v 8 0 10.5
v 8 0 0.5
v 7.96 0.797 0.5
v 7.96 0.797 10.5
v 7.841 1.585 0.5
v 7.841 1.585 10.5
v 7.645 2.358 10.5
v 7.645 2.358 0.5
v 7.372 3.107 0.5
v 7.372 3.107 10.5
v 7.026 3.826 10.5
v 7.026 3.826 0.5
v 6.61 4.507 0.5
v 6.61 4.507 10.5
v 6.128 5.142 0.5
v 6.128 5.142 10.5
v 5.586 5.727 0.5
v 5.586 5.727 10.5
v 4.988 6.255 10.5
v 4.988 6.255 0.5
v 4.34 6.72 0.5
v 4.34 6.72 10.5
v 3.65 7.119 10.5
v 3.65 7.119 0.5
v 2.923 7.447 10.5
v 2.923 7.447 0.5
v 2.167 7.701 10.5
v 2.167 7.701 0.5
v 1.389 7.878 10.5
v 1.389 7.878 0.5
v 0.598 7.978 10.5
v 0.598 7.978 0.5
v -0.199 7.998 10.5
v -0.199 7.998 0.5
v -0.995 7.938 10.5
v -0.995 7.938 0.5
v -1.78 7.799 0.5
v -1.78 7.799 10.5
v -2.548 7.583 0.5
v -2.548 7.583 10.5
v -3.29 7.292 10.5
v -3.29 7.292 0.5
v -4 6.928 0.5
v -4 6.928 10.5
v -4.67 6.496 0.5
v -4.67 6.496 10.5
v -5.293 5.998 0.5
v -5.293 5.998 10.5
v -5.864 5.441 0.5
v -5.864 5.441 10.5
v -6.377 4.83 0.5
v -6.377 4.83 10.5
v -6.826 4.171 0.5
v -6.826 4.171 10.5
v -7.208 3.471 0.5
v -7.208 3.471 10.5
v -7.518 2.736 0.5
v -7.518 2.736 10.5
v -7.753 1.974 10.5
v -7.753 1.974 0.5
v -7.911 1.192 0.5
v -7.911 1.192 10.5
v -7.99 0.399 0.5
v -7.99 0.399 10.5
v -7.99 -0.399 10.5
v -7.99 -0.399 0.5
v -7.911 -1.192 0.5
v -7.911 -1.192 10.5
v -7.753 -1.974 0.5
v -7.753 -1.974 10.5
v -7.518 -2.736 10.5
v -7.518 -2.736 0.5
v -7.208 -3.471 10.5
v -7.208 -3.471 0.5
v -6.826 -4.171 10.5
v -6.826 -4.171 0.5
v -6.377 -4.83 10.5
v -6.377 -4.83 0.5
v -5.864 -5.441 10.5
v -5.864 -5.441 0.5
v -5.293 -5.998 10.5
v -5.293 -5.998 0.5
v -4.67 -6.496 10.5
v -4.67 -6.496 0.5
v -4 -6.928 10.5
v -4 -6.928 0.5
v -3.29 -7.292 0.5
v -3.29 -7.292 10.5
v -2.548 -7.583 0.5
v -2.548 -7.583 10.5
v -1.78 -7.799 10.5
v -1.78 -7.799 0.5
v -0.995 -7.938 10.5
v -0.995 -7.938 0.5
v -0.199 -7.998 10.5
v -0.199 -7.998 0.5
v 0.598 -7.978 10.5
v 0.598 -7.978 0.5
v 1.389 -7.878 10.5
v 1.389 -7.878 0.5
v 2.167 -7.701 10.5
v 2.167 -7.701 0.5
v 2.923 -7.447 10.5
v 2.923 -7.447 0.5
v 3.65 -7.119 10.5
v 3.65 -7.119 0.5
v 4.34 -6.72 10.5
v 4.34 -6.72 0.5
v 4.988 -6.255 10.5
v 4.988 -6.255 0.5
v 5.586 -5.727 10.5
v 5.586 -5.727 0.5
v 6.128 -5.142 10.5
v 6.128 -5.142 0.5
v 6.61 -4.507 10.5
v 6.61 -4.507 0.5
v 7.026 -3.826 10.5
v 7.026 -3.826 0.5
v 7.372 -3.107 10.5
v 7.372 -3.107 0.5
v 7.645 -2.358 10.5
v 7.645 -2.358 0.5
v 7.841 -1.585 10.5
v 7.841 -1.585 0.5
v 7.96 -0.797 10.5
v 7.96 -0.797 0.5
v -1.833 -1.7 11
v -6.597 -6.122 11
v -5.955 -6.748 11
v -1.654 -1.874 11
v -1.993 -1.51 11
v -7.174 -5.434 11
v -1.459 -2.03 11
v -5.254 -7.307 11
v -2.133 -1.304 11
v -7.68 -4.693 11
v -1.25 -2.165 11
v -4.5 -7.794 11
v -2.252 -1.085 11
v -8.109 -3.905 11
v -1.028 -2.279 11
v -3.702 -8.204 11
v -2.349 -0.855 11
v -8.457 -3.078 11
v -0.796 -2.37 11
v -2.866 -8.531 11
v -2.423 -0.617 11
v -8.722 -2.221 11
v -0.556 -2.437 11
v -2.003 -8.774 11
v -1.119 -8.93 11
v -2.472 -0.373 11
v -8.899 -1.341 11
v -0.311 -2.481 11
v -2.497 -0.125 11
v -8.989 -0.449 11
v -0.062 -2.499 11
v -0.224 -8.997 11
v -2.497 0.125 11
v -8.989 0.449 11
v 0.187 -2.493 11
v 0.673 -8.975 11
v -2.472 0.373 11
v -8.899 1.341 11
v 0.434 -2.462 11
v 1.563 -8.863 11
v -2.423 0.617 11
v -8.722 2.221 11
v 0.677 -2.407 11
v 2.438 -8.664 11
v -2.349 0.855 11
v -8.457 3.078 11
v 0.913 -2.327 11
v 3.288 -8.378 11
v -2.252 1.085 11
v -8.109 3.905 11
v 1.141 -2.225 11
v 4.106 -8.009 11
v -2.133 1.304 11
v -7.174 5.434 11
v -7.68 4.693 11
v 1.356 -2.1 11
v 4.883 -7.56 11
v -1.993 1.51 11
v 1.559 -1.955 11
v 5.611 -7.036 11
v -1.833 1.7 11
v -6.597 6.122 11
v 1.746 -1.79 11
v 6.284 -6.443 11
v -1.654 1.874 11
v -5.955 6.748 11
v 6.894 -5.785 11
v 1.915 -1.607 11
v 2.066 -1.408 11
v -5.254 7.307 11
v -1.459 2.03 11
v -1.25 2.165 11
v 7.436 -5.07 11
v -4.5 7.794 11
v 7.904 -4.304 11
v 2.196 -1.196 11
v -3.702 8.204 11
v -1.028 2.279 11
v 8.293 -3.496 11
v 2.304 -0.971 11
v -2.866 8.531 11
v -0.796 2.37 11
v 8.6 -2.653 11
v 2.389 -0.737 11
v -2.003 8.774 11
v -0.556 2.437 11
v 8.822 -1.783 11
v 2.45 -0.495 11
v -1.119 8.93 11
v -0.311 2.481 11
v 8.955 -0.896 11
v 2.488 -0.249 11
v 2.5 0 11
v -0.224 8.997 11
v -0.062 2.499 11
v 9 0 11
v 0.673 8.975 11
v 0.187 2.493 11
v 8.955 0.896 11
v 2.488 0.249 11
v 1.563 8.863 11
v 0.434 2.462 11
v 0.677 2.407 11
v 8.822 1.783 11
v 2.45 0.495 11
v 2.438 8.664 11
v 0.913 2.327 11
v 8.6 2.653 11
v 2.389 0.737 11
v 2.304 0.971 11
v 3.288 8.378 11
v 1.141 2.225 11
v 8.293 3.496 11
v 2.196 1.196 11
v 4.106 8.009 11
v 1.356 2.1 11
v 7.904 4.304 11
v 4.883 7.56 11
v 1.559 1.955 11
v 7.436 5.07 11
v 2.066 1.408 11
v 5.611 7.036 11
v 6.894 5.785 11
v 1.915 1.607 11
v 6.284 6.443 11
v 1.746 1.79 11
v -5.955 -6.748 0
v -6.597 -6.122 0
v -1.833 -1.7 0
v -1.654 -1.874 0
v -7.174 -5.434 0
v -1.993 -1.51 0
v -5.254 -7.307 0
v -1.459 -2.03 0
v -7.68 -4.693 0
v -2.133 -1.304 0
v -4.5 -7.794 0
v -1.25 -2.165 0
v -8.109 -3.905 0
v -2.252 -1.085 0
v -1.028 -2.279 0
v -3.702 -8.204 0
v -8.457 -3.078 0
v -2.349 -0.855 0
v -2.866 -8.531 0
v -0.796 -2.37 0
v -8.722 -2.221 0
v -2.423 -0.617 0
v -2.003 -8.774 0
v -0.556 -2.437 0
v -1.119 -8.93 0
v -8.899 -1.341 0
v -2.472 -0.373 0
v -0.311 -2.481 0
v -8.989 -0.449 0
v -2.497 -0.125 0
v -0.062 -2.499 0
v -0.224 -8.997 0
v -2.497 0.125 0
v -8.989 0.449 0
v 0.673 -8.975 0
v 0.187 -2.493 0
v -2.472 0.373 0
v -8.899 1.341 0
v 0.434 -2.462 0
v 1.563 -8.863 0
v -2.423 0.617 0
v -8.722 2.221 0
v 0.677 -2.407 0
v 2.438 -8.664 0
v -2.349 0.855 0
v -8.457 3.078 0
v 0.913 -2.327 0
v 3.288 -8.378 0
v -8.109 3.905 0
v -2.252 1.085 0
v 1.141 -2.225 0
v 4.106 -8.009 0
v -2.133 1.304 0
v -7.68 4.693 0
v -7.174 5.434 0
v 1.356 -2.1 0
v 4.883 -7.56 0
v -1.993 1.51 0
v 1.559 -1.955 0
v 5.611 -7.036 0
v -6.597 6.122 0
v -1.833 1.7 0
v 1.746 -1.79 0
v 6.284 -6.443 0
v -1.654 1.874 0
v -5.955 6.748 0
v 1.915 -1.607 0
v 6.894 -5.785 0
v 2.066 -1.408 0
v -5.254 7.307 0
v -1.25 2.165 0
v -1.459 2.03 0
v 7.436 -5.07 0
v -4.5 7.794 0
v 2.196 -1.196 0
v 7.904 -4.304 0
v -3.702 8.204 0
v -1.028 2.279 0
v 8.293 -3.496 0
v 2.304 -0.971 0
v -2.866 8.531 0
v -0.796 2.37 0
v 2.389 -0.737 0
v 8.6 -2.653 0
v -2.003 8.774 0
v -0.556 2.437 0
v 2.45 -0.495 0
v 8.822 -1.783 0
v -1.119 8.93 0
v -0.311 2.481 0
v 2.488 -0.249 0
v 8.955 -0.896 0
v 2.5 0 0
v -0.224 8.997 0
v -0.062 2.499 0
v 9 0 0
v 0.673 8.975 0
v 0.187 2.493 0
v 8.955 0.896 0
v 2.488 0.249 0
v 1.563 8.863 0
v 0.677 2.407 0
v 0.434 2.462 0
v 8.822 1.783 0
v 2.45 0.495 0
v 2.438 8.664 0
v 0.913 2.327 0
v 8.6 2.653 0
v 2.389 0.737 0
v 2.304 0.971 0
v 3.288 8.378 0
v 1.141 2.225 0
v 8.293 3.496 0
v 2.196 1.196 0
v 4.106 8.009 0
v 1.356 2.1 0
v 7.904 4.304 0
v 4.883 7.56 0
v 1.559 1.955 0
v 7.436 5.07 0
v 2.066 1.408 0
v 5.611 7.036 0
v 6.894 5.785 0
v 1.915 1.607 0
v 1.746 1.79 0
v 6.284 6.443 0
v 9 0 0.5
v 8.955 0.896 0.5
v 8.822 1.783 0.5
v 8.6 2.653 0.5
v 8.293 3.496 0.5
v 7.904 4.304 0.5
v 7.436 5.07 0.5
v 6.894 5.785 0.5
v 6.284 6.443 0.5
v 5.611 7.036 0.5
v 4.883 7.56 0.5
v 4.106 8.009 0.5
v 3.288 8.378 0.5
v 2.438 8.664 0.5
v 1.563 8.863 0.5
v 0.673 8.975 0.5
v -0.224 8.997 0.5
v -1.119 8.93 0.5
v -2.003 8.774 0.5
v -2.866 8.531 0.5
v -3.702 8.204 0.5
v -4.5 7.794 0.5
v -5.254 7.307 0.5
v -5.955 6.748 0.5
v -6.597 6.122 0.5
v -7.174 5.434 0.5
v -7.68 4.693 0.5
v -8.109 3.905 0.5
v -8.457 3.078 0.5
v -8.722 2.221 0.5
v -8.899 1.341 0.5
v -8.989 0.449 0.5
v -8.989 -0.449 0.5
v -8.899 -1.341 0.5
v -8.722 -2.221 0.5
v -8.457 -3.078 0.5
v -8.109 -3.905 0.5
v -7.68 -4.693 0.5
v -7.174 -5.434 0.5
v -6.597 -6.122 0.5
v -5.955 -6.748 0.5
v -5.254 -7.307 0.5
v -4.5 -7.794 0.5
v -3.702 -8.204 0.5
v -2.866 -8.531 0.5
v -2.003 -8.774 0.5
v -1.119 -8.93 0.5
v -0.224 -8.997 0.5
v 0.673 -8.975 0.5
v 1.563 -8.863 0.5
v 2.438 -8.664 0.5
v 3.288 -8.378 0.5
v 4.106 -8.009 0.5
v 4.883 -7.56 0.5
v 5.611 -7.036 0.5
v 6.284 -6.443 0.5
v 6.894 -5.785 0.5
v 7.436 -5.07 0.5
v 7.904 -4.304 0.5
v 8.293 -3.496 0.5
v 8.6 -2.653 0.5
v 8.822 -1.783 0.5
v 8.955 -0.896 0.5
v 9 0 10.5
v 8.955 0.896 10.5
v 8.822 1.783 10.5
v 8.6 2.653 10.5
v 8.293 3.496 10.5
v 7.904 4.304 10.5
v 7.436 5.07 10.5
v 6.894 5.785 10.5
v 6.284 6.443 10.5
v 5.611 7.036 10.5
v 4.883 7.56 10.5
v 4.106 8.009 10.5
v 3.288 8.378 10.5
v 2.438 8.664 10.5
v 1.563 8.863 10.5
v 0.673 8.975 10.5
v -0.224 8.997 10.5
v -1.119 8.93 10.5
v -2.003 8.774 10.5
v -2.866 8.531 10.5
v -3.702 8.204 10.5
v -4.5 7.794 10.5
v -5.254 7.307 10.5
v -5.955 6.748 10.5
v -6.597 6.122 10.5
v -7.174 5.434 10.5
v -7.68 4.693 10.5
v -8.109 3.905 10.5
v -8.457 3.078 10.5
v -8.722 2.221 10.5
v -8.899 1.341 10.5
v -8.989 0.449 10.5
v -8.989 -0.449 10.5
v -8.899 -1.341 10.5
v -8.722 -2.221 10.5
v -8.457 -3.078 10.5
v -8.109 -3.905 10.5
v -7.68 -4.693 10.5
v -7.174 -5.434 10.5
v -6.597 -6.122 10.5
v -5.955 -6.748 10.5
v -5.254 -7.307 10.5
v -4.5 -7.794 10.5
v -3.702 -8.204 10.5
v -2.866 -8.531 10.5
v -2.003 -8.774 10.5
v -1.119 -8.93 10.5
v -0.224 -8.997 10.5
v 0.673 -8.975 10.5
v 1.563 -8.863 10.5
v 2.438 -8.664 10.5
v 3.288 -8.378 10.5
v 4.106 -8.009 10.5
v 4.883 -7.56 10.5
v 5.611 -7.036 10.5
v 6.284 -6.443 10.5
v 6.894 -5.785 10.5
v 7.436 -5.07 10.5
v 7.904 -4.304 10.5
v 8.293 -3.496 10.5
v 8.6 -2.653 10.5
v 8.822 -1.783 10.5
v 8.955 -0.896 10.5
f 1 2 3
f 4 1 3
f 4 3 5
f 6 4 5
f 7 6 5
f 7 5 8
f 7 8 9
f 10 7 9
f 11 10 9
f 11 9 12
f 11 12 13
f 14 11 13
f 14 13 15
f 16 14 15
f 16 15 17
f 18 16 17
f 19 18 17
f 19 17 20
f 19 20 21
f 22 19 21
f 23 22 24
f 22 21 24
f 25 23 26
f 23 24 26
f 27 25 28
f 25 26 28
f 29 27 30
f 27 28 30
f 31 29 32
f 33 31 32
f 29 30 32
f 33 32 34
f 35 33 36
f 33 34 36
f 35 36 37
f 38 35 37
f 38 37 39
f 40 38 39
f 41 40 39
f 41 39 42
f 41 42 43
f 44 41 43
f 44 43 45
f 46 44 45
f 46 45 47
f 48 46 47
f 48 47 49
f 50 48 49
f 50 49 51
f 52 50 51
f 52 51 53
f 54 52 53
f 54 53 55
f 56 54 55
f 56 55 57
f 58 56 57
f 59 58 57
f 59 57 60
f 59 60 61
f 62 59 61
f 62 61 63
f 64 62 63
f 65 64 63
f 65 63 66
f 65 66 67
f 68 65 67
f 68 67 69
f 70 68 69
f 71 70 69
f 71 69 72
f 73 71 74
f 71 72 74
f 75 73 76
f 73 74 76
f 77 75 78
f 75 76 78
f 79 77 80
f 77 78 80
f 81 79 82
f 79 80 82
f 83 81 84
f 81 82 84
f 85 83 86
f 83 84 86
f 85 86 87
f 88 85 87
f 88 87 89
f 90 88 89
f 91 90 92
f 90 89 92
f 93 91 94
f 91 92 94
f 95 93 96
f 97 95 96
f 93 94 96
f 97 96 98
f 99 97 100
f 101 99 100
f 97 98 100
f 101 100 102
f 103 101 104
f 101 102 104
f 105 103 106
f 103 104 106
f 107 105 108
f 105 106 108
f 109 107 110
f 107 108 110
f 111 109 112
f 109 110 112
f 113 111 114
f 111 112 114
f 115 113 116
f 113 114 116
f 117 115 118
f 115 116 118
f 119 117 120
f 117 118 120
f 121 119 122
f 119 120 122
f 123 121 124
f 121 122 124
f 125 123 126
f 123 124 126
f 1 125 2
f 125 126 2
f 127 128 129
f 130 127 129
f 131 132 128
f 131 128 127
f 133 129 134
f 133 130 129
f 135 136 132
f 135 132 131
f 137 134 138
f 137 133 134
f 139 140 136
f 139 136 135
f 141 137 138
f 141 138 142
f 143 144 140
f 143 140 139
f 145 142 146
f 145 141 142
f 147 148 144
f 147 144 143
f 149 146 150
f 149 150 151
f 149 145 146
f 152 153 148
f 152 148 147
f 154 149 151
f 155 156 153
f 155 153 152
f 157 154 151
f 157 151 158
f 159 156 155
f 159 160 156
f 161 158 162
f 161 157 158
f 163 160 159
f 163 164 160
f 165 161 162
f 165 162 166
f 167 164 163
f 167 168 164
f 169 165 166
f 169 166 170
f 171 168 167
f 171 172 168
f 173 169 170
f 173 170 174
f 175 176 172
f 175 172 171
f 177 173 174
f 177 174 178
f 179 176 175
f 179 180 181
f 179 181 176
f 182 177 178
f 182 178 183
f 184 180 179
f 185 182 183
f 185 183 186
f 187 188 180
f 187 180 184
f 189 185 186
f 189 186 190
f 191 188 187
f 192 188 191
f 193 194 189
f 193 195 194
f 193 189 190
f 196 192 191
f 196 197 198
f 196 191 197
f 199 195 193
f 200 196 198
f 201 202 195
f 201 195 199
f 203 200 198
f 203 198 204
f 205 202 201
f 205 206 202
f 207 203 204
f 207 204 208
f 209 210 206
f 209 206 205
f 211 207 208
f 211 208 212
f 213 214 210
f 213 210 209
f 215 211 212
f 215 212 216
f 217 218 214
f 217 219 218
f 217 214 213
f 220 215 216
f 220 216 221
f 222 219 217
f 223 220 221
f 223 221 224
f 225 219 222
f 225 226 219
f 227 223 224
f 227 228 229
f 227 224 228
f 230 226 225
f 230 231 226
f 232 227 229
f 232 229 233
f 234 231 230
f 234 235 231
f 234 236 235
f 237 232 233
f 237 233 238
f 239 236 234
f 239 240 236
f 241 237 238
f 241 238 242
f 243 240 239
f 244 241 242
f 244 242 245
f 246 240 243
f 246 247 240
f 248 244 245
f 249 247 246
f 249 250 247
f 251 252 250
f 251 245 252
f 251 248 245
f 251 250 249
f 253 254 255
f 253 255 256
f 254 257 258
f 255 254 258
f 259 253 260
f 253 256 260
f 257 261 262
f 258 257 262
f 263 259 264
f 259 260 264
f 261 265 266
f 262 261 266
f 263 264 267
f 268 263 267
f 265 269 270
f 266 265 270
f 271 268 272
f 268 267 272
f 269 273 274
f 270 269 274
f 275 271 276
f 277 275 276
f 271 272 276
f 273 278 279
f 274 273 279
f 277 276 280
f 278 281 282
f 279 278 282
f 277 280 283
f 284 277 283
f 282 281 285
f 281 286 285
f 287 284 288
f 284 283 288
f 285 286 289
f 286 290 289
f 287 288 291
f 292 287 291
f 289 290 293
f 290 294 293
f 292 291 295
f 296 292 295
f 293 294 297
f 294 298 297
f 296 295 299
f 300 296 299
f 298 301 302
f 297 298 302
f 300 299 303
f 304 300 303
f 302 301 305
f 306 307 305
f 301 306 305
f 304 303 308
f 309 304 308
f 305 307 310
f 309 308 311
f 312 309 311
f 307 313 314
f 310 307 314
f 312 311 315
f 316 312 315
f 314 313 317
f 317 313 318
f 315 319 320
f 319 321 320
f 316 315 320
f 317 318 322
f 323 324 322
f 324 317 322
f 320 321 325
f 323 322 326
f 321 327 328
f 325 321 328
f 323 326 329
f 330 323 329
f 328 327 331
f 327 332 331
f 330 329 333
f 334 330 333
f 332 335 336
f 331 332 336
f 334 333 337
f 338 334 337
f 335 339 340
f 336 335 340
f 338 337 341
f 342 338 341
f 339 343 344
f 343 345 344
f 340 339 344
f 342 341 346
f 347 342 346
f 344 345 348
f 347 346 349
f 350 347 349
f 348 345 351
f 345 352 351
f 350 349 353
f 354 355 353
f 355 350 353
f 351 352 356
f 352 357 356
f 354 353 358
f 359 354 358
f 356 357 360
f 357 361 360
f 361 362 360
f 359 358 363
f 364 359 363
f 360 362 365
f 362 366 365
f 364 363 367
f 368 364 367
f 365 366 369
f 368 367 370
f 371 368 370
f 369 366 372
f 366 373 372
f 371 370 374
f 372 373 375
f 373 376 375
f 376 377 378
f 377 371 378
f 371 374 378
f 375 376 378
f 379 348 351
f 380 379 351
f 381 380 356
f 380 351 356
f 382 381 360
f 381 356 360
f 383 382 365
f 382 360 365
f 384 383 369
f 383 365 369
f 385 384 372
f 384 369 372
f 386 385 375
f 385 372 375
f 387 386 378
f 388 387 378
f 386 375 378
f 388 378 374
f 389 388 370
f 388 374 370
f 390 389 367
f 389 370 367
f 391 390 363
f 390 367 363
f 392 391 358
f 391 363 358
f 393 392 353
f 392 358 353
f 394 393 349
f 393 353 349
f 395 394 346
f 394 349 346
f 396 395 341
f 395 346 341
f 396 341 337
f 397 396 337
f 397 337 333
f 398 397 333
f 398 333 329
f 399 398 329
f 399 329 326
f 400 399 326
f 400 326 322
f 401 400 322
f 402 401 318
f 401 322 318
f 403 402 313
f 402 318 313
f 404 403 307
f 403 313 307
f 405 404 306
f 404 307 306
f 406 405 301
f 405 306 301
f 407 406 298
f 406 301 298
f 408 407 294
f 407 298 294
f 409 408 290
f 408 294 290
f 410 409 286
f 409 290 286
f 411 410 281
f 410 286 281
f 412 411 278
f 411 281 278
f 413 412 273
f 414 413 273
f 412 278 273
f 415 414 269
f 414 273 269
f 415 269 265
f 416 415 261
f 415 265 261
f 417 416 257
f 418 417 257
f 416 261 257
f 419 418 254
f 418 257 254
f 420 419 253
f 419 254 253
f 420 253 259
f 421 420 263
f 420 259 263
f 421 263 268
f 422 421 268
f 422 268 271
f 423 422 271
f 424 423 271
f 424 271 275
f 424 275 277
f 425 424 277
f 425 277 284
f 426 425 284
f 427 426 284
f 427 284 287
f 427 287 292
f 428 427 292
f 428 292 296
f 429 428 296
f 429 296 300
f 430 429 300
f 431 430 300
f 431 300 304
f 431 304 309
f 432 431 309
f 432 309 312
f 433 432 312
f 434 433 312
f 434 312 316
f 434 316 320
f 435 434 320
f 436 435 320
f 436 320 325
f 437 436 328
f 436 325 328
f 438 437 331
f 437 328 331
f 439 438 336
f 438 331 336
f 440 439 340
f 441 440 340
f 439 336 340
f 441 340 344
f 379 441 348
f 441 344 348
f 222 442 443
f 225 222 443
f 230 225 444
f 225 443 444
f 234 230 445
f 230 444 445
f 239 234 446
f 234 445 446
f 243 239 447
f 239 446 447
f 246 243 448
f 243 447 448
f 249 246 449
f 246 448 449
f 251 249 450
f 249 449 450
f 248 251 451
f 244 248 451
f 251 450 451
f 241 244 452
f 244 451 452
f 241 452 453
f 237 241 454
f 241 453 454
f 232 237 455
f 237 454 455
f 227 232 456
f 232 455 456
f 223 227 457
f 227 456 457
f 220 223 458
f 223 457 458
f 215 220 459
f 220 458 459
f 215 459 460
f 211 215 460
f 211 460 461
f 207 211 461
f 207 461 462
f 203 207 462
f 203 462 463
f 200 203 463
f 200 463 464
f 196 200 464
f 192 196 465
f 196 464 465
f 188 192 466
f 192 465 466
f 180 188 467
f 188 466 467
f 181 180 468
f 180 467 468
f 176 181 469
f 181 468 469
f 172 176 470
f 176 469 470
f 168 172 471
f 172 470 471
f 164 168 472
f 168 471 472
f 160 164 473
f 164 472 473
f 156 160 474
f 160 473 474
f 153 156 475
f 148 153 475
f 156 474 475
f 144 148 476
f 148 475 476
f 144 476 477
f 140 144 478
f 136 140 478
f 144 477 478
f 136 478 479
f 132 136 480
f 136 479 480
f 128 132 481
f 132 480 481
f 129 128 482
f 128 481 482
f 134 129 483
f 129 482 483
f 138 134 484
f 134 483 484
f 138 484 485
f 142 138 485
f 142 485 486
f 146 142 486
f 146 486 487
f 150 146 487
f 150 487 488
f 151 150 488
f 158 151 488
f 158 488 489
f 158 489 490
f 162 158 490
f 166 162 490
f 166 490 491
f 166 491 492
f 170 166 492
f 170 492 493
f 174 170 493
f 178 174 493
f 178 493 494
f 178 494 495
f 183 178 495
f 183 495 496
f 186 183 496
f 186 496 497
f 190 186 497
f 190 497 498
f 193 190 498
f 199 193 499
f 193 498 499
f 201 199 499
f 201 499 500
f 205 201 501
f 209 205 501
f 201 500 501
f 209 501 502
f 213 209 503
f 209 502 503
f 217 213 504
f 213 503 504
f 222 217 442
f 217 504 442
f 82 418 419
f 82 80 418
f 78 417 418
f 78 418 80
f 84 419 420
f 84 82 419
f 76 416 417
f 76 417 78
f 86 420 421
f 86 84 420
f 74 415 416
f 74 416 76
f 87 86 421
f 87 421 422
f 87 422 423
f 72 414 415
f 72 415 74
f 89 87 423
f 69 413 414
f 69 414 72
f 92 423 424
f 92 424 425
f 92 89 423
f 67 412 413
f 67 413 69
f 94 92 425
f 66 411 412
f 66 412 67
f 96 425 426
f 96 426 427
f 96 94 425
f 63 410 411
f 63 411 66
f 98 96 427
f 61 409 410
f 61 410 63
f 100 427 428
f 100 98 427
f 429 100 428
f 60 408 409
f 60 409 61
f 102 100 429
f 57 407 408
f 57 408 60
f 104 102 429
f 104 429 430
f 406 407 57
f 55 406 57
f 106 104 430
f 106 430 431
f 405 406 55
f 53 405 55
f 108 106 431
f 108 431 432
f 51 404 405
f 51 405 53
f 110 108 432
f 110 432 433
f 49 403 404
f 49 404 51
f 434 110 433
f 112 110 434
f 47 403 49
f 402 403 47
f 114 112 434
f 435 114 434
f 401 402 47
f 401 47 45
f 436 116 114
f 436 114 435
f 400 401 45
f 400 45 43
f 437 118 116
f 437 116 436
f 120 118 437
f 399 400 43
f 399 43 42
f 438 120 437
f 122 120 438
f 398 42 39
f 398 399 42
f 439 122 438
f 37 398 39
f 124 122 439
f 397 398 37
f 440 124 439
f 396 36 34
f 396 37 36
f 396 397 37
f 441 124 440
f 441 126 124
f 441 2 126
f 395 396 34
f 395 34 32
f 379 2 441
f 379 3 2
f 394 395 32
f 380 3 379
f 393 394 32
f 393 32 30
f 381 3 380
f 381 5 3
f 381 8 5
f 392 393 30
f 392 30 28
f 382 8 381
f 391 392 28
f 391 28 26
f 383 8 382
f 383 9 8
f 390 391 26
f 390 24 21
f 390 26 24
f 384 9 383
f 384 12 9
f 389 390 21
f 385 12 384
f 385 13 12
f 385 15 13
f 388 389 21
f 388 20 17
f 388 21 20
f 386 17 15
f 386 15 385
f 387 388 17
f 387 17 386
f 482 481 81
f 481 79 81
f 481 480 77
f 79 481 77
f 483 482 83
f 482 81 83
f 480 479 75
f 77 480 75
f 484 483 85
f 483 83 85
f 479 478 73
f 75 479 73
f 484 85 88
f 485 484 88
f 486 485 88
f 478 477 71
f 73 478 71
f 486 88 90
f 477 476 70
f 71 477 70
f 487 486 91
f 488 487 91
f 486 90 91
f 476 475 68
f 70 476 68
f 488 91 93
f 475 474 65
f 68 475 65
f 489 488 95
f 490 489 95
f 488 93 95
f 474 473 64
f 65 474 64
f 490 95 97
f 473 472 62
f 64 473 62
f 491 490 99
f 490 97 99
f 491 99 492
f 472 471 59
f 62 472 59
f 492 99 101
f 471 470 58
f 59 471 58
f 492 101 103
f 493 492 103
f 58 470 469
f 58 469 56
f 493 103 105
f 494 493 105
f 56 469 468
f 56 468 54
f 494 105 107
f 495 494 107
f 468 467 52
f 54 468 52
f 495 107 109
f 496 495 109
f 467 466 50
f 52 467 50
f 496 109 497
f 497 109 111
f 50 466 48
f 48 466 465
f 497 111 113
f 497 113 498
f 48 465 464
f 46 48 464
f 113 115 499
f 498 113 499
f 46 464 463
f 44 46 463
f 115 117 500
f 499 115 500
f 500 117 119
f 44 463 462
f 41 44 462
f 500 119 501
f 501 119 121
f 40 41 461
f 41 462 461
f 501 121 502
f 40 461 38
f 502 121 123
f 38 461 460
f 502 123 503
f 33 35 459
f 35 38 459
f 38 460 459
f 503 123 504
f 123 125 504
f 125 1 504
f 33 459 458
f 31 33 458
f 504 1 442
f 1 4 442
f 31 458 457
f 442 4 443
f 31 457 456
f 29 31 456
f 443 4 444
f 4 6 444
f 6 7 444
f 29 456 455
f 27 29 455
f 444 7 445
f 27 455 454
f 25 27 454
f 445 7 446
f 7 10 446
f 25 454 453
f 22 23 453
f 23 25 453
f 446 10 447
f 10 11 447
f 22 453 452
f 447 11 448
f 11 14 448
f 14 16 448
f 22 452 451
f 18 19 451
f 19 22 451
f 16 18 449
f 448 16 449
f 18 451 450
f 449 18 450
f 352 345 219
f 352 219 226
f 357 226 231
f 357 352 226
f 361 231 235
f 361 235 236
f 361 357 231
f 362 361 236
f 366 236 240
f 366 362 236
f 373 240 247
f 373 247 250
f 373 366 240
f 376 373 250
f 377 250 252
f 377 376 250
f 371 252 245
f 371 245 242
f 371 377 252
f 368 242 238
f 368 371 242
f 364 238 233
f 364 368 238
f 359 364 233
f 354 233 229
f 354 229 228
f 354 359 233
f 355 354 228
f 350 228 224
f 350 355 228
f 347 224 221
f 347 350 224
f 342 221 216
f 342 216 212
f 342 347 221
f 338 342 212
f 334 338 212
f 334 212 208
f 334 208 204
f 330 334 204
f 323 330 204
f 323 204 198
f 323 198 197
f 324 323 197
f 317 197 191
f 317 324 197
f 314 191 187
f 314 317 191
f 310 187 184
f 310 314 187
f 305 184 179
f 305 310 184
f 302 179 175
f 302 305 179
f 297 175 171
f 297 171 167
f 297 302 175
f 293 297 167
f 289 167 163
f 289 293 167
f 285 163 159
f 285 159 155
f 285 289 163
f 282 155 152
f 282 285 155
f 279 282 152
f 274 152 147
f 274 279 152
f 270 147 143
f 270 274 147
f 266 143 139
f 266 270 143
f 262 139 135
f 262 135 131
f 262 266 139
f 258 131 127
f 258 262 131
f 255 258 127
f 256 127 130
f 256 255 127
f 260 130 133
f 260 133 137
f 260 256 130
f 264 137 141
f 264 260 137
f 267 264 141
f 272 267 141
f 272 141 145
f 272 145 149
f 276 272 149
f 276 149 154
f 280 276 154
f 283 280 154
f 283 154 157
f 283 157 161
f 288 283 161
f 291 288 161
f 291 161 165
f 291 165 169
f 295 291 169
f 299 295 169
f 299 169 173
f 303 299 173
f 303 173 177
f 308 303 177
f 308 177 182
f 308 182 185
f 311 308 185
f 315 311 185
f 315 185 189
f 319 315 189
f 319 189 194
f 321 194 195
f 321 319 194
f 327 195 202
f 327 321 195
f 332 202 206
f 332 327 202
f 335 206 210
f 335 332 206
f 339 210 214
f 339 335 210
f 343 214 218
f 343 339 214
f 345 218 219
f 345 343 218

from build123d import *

# Parameters (mm, degrees)
F0_R     = 8
F0_R_2   = 2.5
F1_DEPTH = 11
F0_R_3   = 9
F2_DEPTH = 0.5
F3_START = 10.5
F3_DEPTH = 0.5


with BuildPart() as f1:
    # F0 (on Top) → F1 (new body)
    with BuildSketch(Plane.XY):
        Circle(F0_R)
        Circle(F0_R_2, mode=Mode.SUBTRACT)
    extrude(amount=F1_DEPTH)

    # F0 (on Top) → F2 (join)
    with BuildSketch(Plane.XY):
        Circle(F0_R_3)
        Circle(F0_R, mode=Mode.SUBTRACT)
    extrude(amount=F2_DEPTH)

    # F0 (on Top) → F3 (join)
    with BuildSketch(Plane.XY.offset(F3_START)):
        Circle(F0_R_3)
        Circle(F0_R, mode=Mode.SUBTRACT)
    extrude(amount=F3_DEPTH)


solid = f1.part
